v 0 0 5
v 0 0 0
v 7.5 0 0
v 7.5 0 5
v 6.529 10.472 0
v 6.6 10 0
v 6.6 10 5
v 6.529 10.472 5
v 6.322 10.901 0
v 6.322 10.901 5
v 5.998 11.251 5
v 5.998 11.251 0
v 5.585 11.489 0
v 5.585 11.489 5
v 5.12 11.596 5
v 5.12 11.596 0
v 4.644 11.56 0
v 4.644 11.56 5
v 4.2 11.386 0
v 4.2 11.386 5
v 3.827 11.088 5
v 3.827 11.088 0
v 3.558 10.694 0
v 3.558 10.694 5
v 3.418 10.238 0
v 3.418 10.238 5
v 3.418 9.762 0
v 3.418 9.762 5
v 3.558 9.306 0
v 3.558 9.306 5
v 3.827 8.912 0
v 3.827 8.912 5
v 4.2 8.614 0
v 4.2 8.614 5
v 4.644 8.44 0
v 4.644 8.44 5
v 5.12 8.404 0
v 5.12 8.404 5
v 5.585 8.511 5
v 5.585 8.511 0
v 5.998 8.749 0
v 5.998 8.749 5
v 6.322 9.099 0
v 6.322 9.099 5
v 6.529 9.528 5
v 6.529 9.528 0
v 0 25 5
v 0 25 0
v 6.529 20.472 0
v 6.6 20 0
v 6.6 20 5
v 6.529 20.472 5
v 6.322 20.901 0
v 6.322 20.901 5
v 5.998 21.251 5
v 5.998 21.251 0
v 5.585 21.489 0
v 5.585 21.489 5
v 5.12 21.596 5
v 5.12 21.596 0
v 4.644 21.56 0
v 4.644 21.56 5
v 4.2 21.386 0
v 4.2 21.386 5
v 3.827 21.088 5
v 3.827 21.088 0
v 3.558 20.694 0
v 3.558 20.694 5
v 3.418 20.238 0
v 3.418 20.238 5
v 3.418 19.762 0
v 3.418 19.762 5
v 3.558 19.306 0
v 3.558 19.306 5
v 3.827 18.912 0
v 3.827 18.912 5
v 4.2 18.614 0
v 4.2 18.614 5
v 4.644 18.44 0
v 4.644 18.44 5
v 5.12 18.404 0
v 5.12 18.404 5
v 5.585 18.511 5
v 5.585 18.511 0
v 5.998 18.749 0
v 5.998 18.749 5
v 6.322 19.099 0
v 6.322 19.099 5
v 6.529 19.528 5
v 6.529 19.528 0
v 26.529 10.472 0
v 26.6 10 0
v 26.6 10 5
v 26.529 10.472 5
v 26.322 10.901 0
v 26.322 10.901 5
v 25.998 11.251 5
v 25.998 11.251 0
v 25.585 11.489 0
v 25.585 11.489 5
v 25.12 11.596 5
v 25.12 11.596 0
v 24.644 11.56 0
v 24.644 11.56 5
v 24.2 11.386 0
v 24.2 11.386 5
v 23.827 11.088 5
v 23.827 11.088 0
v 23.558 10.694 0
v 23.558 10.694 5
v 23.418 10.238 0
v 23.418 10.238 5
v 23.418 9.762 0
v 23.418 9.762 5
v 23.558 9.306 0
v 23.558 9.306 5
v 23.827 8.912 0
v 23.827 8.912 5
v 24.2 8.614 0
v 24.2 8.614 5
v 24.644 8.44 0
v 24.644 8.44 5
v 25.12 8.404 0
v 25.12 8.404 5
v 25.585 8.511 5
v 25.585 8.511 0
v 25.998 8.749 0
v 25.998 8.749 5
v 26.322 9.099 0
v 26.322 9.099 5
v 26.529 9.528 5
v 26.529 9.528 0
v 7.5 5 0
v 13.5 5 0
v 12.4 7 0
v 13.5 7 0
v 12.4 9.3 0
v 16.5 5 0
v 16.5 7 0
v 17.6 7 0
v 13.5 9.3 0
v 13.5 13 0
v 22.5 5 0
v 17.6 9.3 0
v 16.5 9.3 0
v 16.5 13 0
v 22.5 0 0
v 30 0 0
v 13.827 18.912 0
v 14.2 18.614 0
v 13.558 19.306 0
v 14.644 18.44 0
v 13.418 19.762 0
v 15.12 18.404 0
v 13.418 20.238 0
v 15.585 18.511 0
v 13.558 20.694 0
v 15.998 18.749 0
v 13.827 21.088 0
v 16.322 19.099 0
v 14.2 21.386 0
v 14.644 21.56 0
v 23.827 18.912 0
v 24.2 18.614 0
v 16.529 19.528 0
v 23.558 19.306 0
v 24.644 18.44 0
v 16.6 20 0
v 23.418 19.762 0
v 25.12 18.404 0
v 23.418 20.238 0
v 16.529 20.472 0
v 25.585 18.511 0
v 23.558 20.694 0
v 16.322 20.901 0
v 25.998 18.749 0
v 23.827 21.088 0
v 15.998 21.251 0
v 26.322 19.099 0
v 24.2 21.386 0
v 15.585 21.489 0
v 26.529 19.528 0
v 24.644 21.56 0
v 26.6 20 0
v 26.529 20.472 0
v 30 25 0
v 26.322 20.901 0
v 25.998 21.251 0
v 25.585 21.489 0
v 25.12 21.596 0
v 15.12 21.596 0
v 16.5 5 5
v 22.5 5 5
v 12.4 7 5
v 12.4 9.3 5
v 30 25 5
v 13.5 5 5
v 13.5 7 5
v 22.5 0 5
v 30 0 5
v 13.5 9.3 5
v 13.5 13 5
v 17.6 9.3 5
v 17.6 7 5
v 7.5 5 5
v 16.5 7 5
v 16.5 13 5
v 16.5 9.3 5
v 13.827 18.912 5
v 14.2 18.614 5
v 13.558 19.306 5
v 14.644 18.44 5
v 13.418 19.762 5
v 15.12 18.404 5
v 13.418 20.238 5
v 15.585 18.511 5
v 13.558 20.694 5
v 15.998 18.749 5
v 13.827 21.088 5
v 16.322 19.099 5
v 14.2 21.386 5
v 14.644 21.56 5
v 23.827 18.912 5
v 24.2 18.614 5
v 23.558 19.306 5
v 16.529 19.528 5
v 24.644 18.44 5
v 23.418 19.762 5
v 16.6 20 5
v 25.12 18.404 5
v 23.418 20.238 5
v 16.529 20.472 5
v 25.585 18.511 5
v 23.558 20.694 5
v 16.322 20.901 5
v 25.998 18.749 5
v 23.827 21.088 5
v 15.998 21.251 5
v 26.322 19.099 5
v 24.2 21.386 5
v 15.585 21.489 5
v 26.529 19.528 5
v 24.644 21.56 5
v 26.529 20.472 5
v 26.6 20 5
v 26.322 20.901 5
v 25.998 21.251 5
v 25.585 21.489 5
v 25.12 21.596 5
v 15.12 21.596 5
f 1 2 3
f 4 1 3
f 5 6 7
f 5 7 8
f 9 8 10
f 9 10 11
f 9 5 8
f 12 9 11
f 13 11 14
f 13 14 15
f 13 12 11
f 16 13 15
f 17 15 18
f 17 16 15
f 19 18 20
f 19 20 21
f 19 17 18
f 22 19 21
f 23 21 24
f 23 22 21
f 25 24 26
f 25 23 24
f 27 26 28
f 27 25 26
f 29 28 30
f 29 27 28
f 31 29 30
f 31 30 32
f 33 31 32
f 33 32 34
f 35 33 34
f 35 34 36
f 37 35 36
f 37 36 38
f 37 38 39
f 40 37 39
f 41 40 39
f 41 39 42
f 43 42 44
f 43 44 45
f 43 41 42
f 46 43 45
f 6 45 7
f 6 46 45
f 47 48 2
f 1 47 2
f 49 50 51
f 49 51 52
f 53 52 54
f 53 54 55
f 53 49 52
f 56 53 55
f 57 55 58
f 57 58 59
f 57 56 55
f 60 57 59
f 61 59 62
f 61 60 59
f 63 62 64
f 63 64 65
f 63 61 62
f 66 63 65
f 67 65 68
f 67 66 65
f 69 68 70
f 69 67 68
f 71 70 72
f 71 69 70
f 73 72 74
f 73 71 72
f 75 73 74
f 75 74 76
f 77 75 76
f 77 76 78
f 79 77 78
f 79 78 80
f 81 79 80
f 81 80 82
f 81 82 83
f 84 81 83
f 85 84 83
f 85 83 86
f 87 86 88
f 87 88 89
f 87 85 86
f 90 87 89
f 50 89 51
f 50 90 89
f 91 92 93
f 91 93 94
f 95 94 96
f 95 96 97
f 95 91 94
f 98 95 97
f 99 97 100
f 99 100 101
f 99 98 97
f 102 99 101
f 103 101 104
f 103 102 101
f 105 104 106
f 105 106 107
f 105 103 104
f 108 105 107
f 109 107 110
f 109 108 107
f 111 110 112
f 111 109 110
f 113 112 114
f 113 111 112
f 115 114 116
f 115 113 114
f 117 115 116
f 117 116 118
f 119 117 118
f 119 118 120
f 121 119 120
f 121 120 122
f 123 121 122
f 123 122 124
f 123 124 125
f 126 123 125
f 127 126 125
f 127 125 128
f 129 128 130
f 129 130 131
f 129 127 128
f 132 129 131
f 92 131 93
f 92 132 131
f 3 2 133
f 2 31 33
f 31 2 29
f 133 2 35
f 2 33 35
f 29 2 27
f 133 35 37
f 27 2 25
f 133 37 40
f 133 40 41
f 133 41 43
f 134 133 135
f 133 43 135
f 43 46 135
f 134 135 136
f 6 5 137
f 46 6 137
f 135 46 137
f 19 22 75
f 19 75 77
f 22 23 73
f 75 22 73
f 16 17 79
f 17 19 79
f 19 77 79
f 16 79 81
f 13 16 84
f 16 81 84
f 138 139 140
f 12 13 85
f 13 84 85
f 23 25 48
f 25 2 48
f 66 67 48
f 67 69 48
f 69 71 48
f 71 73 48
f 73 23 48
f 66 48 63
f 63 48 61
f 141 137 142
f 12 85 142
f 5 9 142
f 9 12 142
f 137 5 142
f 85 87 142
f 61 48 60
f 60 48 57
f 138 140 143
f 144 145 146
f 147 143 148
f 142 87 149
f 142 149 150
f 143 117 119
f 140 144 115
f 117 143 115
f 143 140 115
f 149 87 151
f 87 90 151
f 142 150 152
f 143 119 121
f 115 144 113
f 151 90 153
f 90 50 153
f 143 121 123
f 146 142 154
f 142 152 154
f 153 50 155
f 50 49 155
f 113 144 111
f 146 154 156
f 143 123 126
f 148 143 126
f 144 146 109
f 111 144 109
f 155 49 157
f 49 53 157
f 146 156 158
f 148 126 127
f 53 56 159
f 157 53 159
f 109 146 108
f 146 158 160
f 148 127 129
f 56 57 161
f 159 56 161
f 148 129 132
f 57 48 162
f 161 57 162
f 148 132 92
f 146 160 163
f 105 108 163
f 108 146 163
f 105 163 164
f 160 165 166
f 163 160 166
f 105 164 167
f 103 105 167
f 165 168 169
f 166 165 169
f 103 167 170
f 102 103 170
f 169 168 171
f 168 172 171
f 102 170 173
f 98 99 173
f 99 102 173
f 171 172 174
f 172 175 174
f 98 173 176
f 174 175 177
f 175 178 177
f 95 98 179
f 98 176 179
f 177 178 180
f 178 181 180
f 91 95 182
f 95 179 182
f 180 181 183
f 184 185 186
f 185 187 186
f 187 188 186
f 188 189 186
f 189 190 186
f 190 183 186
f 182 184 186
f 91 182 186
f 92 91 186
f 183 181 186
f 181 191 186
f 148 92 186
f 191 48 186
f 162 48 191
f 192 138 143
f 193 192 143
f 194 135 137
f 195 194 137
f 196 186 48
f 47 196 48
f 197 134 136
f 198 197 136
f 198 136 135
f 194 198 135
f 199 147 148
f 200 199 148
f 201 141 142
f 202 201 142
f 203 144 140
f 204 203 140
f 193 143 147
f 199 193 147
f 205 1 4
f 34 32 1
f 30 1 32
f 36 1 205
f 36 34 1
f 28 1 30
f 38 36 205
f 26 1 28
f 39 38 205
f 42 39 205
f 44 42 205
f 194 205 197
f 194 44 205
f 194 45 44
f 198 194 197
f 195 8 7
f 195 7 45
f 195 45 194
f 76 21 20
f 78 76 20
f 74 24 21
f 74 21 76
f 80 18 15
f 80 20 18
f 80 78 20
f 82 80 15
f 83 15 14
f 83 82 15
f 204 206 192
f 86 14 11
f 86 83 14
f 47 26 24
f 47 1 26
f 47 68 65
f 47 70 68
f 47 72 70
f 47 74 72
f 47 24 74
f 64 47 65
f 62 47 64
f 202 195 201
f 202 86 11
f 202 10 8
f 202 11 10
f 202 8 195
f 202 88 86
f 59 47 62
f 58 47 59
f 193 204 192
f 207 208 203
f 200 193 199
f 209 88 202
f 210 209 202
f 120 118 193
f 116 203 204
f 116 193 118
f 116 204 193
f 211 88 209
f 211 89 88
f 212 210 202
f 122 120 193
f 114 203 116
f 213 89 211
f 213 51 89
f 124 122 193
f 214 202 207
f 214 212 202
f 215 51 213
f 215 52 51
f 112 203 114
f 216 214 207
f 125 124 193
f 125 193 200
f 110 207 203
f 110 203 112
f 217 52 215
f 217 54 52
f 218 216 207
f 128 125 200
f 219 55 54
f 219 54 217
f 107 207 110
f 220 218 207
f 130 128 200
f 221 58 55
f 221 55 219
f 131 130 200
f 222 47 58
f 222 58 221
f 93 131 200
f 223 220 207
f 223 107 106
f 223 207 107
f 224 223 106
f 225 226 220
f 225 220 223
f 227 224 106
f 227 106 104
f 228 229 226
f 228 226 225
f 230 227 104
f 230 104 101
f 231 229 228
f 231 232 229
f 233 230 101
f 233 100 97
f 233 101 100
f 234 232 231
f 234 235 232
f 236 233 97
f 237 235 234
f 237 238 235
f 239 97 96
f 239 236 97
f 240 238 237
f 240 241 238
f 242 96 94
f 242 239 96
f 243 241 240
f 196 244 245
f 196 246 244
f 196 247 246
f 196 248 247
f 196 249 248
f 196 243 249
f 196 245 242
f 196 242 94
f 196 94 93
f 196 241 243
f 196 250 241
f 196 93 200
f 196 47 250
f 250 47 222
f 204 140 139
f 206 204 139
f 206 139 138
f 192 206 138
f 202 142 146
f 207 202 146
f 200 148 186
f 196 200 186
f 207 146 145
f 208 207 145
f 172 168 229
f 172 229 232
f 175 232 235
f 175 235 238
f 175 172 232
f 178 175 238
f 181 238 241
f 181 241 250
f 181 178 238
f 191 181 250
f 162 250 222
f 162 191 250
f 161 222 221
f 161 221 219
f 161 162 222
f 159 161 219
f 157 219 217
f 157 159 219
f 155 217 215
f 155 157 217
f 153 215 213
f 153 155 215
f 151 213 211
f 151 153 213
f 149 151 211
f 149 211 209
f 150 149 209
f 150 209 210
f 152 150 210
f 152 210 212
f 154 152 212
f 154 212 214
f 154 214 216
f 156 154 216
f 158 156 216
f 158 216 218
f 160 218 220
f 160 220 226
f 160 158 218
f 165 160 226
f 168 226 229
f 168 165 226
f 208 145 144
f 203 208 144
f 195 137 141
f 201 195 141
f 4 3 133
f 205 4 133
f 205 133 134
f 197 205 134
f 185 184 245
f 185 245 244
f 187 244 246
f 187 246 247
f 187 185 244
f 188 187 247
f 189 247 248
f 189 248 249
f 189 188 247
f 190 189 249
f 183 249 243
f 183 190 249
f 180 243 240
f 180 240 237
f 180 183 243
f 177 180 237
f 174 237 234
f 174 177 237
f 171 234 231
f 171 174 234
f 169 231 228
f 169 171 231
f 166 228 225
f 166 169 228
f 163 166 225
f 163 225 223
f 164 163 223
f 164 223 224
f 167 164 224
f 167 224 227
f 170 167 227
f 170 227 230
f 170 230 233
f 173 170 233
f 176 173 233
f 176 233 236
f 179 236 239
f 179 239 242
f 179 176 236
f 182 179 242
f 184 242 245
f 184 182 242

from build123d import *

# Parameters (mm, degrees)
ESQUISSE1_R        = 1.6
BOSS_EXTRU_1_DEPTH = 5


with BuildPart() as part:
    # Esquisse1 → Boss.-Extru.1 (new body)
    with BuildSketch(Plane.XY):
        Polygon((0, 0), (7.5, 0), (7.5, 5), (13.5, 5), (13.5, 7), (12.4, 7), (12.4, 9.3), (13.5, 9.3), (13.5, 13), (16.5, 13), (16.5, 9.3), (17.6, 9.3), (17.6, 7), (16.5, 7), (16.5, 5), (22.5, 5), (22.5, 0), (30, 0), (30, 25), (0, 25), align=None)
        with Locations((5, 10)):
            Circle(ESQUISSE1_R, mode=Mode.SUBTRACT)
        with Locations((5, 20)):
            Circle(ESQUISSE1_R, mode=Mode.SUBTRACT)
        with Locations((25, 10)):
            Circle(ESQUISSE1_R, mode=Mode.SUBTRACT)
        with Locations((15, 20)):
            Circle(ESQUISSE1_R, mode=Mode.SUBTRACT)
        with Locations((25, 20)):
            Circle(ESQUISSE1_R, mode=Mode.SUBTRACT)
    extrude(amount=BOSS_EXTRU_1_DEPTH)


solid = part.part
